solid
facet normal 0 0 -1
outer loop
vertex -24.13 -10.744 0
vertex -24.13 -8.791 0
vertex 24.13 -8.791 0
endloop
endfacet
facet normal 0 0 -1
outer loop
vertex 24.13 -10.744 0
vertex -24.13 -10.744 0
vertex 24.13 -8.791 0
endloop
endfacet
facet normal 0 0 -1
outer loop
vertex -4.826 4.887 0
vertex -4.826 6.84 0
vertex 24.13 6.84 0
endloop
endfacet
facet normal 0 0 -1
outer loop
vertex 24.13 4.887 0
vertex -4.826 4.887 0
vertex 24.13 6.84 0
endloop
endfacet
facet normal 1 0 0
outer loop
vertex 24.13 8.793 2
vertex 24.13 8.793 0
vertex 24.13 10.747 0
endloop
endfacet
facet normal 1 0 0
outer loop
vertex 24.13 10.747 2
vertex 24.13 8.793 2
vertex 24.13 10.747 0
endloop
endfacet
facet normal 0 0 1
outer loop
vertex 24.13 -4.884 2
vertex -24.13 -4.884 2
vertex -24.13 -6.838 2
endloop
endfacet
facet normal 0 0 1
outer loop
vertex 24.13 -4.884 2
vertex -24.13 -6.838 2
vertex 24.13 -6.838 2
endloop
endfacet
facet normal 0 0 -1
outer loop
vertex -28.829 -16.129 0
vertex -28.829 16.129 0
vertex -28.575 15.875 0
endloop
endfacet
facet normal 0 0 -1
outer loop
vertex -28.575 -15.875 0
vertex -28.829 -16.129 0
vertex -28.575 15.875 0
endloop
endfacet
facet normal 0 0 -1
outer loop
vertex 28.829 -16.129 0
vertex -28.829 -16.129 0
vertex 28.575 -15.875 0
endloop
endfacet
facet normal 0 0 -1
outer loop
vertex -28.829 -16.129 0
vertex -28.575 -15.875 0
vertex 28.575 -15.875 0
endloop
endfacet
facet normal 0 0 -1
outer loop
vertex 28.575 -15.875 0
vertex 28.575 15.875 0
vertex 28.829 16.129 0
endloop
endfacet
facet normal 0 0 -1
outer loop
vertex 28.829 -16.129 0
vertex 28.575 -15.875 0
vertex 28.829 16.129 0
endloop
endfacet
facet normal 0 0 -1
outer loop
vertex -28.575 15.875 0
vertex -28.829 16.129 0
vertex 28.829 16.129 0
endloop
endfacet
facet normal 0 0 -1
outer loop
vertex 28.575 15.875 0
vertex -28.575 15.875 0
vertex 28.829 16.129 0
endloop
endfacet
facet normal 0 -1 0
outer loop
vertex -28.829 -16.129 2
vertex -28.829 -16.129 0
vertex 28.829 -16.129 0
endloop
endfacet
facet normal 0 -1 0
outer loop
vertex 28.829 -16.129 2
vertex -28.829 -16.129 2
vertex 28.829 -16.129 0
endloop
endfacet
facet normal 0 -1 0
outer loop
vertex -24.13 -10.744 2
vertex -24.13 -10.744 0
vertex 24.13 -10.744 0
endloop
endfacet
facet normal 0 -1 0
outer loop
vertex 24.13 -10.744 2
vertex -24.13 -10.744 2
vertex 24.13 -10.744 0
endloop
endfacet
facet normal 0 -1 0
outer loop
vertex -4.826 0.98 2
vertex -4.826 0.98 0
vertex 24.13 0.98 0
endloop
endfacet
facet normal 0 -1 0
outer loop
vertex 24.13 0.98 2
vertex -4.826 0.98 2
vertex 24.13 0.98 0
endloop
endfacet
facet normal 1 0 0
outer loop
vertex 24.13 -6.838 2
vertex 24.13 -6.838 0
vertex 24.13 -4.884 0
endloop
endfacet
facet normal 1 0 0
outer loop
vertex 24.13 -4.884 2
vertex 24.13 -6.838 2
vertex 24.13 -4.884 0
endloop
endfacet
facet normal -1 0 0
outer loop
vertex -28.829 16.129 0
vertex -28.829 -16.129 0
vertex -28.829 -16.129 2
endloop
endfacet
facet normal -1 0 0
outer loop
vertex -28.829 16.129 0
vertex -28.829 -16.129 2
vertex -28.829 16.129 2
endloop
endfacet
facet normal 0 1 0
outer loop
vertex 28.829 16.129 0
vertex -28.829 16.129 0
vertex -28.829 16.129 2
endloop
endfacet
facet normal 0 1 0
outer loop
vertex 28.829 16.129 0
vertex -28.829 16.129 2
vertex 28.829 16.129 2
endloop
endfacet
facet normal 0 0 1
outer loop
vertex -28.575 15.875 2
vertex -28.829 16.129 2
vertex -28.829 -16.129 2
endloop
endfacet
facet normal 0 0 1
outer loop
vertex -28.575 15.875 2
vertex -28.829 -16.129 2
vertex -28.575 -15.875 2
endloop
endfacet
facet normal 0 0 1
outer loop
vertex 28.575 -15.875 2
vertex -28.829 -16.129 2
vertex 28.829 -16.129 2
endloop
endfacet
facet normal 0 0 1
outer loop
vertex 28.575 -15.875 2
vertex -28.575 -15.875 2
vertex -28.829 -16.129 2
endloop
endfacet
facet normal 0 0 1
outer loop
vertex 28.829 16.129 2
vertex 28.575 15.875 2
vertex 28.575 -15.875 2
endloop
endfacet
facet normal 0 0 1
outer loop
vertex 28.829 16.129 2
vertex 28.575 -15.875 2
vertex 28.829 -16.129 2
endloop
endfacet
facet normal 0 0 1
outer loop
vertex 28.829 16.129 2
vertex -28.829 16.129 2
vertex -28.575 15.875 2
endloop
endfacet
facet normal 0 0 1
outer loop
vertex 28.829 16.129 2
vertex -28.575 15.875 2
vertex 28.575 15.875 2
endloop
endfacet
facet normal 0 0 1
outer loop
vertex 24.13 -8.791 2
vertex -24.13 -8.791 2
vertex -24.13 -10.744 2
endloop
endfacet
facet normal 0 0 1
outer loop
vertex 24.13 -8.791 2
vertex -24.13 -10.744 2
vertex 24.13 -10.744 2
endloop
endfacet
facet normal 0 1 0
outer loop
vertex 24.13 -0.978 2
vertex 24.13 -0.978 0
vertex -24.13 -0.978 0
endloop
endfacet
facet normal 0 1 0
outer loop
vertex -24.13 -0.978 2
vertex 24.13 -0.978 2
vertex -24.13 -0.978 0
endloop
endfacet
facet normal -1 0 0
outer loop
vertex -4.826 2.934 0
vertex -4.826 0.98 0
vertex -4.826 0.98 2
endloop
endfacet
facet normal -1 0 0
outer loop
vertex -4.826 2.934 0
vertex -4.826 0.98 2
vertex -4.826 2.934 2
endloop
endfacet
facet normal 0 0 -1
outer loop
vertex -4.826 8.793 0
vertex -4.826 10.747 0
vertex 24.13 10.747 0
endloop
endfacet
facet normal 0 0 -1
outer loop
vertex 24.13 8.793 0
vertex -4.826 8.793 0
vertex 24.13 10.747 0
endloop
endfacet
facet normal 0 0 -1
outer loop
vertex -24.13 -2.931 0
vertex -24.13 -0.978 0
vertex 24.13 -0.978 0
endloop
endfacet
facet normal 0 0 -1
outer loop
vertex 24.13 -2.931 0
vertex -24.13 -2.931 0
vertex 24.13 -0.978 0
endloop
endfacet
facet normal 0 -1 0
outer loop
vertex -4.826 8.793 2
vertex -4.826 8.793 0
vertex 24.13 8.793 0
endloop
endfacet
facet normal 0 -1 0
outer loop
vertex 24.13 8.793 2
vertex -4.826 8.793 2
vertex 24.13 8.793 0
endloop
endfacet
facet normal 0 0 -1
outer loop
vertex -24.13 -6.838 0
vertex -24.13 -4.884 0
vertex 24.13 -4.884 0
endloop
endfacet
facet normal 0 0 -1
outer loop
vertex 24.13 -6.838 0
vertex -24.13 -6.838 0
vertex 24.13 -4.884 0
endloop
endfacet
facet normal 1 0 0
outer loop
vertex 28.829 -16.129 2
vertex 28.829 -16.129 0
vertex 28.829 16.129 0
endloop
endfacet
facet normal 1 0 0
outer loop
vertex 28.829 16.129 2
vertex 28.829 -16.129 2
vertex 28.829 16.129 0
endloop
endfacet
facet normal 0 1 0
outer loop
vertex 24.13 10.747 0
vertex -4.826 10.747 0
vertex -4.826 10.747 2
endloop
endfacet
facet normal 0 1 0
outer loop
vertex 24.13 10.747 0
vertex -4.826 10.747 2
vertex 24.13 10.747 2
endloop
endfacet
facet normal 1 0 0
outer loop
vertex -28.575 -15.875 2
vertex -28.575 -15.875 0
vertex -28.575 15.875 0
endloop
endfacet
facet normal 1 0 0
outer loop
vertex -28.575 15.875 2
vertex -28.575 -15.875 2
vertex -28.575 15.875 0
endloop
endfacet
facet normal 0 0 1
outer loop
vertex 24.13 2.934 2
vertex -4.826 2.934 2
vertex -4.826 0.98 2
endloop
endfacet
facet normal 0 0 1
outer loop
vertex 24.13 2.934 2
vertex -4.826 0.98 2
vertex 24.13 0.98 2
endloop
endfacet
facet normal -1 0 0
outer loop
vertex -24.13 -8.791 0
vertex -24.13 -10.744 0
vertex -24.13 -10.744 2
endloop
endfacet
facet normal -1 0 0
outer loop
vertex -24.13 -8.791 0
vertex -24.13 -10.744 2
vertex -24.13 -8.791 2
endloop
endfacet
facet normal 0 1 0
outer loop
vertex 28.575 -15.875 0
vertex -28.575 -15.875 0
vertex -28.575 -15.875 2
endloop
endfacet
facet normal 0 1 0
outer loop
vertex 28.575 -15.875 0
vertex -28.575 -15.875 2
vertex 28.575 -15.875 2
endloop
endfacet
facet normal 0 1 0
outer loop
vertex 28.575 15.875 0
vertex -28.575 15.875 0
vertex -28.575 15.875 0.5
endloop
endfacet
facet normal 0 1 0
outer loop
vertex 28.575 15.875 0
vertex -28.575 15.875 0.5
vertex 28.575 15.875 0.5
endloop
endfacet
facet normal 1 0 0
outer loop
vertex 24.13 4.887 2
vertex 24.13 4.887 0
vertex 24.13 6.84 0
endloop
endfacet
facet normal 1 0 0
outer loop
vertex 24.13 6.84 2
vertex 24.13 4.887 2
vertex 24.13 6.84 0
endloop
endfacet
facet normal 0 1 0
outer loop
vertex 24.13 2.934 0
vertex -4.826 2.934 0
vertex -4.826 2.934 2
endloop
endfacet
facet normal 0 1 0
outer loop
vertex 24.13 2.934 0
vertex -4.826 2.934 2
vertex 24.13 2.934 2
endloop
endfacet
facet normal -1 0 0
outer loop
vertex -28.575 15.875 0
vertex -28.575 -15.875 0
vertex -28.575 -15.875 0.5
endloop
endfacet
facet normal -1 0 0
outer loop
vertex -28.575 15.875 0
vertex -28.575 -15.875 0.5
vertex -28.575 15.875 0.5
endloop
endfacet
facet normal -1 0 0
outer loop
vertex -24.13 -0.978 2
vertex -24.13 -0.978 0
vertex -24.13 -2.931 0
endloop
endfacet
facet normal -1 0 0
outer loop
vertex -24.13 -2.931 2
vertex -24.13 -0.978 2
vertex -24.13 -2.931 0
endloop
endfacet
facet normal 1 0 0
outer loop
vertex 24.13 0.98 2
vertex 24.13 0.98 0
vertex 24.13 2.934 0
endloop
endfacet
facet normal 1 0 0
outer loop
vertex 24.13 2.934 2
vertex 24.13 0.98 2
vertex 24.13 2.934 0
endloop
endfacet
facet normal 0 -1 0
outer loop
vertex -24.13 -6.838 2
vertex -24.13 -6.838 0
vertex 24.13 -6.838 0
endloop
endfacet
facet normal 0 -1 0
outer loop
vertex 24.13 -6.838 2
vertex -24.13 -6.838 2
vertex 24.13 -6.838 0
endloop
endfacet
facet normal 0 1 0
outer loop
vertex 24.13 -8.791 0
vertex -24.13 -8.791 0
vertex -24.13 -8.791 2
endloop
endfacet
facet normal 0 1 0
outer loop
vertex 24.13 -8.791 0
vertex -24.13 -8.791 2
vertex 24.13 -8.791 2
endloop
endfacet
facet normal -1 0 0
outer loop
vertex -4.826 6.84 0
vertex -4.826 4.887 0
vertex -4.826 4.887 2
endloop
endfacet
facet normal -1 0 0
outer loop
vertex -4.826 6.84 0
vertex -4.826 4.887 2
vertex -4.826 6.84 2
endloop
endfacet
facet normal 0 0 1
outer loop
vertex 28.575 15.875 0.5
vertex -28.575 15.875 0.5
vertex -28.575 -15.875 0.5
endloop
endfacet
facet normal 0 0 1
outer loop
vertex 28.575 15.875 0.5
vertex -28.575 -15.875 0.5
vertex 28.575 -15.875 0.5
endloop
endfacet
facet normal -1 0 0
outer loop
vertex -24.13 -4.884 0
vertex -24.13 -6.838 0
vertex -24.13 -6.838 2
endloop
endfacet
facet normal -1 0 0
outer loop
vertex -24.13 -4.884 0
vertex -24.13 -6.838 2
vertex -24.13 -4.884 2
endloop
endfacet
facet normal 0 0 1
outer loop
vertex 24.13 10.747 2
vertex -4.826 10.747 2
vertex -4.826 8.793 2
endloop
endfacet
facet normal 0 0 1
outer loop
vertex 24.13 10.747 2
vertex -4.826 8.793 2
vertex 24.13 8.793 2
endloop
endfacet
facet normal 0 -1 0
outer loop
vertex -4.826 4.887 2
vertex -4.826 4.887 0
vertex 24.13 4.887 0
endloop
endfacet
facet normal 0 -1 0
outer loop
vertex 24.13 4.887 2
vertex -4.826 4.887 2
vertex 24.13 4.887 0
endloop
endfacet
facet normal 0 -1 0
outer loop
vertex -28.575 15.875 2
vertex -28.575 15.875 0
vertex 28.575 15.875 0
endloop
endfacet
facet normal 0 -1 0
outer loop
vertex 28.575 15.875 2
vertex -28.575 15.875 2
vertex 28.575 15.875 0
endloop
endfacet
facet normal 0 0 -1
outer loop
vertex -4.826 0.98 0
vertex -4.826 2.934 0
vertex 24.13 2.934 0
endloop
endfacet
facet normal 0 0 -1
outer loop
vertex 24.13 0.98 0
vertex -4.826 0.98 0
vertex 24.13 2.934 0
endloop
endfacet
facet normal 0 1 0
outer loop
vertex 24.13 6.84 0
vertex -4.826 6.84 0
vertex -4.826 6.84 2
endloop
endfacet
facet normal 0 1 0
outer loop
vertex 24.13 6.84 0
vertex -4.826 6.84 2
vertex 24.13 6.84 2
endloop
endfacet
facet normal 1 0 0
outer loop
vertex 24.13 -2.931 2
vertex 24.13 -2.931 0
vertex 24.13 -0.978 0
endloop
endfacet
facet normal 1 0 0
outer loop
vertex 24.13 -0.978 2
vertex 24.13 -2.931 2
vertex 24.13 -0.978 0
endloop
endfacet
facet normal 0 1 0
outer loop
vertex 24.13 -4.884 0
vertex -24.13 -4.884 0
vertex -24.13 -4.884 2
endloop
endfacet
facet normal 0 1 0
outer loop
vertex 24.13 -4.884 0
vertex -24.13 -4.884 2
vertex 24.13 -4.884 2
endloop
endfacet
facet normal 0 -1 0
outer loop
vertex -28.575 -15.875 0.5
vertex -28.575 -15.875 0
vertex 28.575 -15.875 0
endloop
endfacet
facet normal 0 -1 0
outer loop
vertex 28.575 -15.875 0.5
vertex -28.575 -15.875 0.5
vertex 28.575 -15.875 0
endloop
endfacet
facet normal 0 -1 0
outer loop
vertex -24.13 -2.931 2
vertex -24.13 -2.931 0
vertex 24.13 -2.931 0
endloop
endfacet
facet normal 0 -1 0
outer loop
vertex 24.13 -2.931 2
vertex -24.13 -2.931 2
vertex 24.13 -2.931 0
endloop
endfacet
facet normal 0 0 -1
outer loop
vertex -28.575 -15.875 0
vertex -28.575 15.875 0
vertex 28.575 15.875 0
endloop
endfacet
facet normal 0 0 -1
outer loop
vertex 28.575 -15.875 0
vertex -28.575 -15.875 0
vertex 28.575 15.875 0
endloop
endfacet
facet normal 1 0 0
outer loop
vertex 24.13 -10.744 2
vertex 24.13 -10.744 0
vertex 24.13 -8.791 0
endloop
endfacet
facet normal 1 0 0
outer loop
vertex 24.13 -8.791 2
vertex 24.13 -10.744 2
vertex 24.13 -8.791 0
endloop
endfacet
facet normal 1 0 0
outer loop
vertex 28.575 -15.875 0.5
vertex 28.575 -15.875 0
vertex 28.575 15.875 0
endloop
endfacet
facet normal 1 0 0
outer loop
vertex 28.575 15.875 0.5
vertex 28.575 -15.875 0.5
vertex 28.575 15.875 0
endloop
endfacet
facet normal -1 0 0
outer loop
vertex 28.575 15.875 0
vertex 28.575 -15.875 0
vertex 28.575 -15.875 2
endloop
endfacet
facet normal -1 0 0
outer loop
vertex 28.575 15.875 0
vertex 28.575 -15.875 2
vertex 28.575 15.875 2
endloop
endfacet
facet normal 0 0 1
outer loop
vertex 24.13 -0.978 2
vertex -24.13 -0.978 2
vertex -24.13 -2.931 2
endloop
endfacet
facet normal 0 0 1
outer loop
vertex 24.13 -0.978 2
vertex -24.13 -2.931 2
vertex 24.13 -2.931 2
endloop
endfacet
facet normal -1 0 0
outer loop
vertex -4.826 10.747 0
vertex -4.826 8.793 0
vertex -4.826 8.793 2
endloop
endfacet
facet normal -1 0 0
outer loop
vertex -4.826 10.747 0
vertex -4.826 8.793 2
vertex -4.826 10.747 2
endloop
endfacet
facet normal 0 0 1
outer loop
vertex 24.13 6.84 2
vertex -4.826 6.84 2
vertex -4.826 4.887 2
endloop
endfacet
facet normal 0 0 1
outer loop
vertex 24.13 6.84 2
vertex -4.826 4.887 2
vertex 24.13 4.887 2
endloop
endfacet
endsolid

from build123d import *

# Parameters (mm, degrees)
F0_W     = 48.26
F0_H     = 1.95326
F0_W_2   = 28.956
F1_DEPTH = 2
F2_W     = 57.658
F2_H     = 32.258
F2_W_2   = 57.15
F2_H_2   = 31.75
F3_DEPTH = 2
F4_W     = 57.15
F4_H     = 31.75
F5_DEPTH = 0.5


with BuildPart() as f1:
    # F0 (on Top) → F1 (new body)
    with BuildSketch(Plane.XY):
        with Locations((0, -9.76757)):
            Rectangle(F0_W, F0_H)
        with Locations((0, -5.86105)):
            Rectangle(F0_W, F0_H)
        Polygon((-4.826, -0.9779), (-24.13, -0.9779), (-24.13, -2.93116), (24.13, -2.93116), (24.13, -0.9779), align=None)
        with Locations((9.652, 1.95707)):
            Rectangle(F0_W_2, F0_H)
        with Locations((9.652, 5.86359)):
            Rectangle(F0_W_2, F0_H)
        with Locations((9.652, 9.77011)):
            Rectangle(F0_W_2, F0_H)
    extrude(amount=F1_DEPTH)


with BuildPart() as f3:
    # F2 (on Top) → F3 (new body)
    with BuildSketch(Plane.XY):
        Rectangle(F2_W, F2_H)
        Rectangle(F2_W_2, F2_H_2, mode=Mode.SUBTRACT)
    extrude(amount=F3_DEPTH)


with BuildPart() as f5:
    # F4 (on Top) → F5 (new body)
    with BuildSketch(Plane.XY):
        Rectangle(F4_W, F4_H)
    extrude(amount=F5_DEPTH)


solid = Compound([f1.part, f3.part, f5.part])
